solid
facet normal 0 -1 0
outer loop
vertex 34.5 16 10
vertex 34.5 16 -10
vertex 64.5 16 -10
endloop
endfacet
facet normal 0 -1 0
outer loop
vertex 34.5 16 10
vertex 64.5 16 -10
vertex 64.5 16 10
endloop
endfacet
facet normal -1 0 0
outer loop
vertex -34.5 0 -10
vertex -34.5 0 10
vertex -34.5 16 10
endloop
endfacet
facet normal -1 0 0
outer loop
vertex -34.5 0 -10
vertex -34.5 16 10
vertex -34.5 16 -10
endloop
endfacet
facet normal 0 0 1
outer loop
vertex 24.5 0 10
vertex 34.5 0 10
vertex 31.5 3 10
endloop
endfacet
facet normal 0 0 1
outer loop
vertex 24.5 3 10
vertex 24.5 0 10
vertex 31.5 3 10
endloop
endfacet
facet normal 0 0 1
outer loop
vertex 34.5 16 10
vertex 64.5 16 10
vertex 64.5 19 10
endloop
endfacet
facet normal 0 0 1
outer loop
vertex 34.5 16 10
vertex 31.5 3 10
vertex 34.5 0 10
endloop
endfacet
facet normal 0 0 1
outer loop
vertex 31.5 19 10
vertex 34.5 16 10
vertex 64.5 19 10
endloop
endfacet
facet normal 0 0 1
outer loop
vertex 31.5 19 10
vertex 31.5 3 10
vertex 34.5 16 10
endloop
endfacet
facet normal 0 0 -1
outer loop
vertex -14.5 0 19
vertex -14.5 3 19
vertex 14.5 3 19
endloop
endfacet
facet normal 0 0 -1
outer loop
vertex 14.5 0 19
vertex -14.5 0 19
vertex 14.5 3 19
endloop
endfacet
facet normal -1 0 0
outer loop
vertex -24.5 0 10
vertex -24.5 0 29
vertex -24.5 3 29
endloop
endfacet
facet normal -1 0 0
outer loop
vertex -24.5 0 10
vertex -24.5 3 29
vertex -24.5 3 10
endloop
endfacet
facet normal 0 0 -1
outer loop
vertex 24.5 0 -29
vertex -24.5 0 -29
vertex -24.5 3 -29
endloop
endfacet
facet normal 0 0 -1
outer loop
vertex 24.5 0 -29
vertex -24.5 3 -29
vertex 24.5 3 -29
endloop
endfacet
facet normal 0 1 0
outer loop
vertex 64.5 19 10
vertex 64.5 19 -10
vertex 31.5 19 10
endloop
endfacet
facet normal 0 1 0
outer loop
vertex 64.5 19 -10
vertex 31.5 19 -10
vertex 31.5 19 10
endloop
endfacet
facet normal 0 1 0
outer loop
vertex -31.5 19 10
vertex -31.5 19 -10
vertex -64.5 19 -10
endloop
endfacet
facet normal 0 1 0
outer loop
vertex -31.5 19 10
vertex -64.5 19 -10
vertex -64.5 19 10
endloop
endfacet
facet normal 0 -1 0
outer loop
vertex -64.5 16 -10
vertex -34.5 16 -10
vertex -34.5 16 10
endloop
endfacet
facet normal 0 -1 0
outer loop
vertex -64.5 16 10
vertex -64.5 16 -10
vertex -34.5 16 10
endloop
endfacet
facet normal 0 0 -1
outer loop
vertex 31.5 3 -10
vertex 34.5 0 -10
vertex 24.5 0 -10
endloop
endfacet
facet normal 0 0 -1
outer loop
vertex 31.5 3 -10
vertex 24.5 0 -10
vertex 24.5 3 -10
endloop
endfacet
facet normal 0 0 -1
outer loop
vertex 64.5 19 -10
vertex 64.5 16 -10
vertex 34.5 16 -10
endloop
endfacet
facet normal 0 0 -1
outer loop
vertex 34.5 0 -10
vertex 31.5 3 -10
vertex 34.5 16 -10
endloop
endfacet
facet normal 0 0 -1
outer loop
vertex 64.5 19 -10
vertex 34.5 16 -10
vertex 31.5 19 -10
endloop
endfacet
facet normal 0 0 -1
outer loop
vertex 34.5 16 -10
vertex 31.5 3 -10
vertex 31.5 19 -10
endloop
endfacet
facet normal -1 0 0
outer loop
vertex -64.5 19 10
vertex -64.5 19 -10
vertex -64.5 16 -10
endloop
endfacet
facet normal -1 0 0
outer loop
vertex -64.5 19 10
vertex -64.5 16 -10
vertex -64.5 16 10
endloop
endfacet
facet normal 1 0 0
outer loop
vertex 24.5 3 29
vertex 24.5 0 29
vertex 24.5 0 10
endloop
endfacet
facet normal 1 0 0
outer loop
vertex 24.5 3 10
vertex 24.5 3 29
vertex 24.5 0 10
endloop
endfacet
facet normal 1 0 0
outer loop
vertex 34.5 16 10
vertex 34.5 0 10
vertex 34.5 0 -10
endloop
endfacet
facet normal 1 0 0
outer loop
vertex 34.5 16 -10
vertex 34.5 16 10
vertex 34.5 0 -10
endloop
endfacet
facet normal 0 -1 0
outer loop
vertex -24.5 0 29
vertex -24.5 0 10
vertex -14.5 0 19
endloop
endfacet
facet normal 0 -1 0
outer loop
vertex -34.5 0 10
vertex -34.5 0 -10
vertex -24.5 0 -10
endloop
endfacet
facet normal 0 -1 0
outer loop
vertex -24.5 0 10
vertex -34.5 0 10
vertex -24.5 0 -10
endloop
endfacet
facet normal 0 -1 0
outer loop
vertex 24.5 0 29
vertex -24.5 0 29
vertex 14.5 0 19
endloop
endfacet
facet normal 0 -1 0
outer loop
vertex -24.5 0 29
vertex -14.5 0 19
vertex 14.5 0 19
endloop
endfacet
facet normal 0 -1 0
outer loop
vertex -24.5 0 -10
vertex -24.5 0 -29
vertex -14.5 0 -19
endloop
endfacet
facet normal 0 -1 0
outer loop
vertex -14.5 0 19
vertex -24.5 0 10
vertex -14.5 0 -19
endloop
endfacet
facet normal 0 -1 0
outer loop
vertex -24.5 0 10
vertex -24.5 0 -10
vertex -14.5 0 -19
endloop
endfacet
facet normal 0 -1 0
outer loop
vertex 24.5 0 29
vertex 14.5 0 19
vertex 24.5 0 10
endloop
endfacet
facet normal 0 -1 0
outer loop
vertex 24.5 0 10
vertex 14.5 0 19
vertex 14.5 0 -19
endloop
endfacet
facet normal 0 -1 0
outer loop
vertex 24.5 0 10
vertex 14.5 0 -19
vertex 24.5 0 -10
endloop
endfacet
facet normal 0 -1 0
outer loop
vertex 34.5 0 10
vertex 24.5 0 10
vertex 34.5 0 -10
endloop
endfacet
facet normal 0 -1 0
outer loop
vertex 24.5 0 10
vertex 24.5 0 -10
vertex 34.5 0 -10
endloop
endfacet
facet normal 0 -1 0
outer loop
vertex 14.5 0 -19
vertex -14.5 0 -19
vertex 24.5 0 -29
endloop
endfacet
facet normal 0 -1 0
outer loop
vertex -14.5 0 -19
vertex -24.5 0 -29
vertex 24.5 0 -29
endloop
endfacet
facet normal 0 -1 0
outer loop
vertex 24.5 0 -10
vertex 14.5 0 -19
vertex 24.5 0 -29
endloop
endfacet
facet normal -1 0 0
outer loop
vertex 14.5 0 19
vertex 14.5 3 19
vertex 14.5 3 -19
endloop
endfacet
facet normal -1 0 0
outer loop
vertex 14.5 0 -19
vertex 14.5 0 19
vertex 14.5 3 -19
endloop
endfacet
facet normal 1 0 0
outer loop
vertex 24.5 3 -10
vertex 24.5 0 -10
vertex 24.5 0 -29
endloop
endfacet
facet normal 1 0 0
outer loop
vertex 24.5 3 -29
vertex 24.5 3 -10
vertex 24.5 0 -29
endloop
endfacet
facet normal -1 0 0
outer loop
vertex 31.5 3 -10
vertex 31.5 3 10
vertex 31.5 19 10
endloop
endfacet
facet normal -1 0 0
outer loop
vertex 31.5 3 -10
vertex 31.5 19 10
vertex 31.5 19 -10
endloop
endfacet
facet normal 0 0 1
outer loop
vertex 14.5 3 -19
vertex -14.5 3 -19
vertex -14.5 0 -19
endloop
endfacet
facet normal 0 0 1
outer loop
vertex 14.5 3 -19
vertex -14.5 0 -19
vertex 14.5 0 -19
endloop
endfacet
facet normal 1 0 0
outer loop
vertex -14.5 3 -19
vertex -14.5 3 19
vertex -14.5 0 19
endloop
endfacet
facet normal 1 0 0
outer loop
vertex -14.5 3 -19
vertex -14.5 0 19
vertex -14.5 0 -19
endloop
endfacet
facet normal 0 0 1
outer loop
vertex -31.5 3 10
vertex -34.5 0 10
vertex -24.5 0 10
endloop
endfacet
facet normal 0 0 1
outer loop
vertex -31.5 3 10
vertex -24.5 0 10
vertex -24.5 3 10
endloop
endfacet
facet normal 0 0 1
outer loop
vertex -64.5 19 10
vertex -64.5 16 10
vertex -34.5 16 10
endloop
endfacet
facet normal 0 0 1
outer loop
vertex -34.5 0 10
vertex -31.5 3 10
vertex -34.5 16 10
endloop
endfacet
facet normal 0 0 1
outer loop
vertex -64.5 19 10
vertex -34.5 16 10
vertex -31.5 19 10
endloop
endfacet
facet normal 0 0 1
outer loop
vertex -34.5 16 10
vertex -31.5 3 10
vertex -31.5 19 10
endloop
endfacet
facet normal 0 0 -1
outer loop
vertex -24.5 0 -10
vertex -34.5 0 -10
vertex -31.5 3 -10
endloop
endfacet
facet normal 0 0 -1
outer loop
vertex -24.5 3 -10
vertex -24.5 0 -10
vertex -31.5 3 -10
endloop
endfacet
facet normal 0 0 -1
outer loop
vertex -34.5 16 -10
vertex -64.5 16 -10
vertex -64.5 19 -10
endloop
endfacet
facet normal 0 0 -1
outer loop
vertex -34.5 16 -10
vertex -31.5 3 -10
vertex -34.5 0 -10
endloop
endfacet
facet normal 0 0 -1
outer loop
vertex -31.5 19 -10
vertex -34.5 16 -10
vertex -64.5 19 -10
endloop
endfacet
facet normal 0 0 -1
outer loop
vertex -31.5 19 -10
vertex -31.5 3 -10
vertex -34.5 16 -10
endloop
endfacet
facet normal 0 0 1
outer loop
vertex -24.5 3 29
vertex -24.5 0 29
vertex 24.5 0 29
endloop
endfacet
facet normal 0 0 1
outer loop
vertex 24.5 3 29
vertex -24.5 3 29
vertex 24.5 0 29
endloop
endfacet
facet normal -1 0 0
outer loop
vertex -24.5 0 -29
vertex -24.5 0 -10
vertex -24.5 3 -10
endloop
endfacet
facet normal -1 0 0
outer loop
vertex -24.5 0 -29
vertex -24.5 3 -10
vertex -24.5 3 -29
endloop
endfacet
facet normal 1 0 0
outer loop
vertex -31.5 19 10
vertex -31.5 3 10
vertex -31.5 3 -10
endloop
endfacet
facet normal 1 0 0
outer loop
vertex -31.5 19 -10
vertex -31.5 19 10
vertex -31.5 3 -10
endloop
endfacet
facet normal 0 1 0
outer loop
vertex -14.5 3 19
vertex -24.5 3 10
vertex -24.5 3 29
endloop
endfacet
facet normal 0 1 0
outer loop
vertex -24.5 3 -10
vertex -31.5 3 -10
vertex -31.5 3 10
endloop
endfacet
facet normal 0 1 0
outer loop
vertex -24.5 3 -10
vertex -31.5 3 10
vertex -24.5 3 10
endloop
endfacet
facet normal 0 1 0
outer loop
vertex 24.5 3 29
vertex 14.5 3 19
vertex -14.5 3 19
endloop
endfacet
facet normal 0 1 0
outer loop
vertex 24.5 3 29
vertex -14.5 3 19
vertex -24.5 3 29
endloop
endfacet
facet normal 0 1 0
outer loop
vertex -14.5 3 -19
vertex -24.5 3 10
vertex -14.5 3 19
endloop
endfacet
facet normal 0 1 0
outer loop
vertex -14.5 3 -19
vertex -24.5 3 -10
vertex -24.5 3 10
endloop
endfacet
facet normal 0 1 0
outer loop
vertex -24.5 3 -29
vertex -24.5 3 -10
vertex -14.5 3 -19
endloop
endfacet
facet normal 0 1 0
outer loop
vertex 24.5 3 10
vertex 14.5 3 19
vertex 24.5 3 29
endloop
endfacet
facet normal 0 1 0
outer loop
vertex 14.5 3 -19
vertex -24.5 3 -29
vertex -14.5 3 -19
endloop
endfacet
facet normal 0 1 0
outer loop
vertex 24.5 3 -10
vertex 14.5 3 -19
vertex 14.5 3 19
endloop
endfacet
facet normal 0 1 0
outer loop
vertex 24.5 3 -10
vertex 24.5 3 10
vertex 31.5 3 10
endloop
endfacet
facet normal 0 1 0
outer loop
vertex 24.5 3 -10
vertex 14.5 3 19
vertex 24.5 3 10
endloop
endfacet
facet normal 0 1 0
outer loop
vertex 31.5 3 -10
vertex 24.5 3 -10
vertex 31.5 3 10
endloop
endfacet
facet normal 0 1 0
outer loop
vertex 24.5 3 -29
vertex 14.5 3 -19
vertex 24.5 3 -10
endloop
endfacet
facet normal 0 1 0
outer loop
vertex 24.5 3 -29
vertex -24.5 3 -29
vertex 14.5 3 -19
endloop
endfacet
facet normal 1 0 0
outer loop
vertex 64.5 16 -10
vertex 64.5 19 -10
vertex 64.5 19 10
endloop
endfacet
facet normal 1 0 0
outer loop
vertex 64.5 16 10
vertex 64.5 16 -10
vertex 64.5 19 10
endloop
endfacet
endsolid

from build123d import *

# Parameters (mm, degrees)
SKETCH2_W           = 49
SKETCH2_H           = 58
BOSS_EXTRUDE1_DEPTH = 3
SKETCH3_W           = 29
SKETCH3_H           = 38
CUT_EXTRUDE1_DEPTH  = 3
SKETCH4_W           = 20
SKETCH4_H           = 3
BOSS_EXTRUDE2_DEPTH = 10
SKETCH5_W           = 3
SKETCH5_H           = 20
BOSS_EXTRUDE3_DEPTH = 16
SKETCH7_W           = 20
SKETCH7_H           = 3
BOSS_EXTRUDE4_DEPTH = 30


with BuildPart() as part:
    # Sketch2 → Boss-Extrude1 (new body)
    with BuildSketch(Plane(origin=(0, 0, 0), x_dir=(1, 0, 0), z_dir=(0, 1, 0))):
        Rectangle(SKETCH2_W, SKETCH2_H)
    extrude(amount=BOSS_EXTRUDE1_DEPTH)

    # Sketch3 → Cut-Extrude1 (cut)
    with BuildSketch(Plane(origin=(0, 3, 0), x_dir=(1, 0, 0), z_dir=(0, 1, 0))):
        Rectangle(SKETCH3_W, SKETCH3_H)
    extrude(amount=-CUT_EXTRUDE1_DEPTH, mode=Mode.SUBTRACT)

    # Sketch4 → Boss-Extrude2 (add)
    with BuildSketch(Plane.ZY.offset(24.5)):
        with Locations((0, 1.5)):
            Rectangle(SKETCH4_W, SKETCH4_H)
    boss_extrude2 = extrude(amount=BOSS_EXTRUDE2_DEPTH)

    # Sketch5 → Boss-Extrude3 (add)
    with BuildSketch(Plane(origin=(0, 3, 0), x_dir=(1, 0, 0), z_dir=(0, 1, 0))):
        with Locations((-33, 0)):
            Rectangle(SKETCH5_W, SKETCH5_H)
    boss_extrude3 = extrude(amount=BOSS_EXTRUDE3_DEPTH)

    # Sketch7 → Boss-Extrude4 (add)
    with BuildSketch(Plane.ZY.offset(34.5)):
        with Locations((0, 17.5)):
            Rectangle(SKETCH7_W, SKETCH7_H)
    boss_extrude4 = extrude(amount=BOSS_EXTRUDE4_DEPTH)

    # Mirror1: Boss-Extrude2, Boss-Extrude3, Boss-Extrude4 across plane
    add(boss_extrude2.mirror(Plane(origin=(0, 0, 0), x_dir=(0, 0, 1), z_dir=(1, 0, 0))))
    add(boss_extrude3.mirror(Plane(origin=(0, 0, 0), x_dir=(0, 0, 1), z_dir=(1, 0, 0))))
    add(boss_extrude4.mirror(Plane(origin=(0, 0, 0), x_dir=(0, 0, 1), z_dir=(1, 0, 0))))


solid = part.part
